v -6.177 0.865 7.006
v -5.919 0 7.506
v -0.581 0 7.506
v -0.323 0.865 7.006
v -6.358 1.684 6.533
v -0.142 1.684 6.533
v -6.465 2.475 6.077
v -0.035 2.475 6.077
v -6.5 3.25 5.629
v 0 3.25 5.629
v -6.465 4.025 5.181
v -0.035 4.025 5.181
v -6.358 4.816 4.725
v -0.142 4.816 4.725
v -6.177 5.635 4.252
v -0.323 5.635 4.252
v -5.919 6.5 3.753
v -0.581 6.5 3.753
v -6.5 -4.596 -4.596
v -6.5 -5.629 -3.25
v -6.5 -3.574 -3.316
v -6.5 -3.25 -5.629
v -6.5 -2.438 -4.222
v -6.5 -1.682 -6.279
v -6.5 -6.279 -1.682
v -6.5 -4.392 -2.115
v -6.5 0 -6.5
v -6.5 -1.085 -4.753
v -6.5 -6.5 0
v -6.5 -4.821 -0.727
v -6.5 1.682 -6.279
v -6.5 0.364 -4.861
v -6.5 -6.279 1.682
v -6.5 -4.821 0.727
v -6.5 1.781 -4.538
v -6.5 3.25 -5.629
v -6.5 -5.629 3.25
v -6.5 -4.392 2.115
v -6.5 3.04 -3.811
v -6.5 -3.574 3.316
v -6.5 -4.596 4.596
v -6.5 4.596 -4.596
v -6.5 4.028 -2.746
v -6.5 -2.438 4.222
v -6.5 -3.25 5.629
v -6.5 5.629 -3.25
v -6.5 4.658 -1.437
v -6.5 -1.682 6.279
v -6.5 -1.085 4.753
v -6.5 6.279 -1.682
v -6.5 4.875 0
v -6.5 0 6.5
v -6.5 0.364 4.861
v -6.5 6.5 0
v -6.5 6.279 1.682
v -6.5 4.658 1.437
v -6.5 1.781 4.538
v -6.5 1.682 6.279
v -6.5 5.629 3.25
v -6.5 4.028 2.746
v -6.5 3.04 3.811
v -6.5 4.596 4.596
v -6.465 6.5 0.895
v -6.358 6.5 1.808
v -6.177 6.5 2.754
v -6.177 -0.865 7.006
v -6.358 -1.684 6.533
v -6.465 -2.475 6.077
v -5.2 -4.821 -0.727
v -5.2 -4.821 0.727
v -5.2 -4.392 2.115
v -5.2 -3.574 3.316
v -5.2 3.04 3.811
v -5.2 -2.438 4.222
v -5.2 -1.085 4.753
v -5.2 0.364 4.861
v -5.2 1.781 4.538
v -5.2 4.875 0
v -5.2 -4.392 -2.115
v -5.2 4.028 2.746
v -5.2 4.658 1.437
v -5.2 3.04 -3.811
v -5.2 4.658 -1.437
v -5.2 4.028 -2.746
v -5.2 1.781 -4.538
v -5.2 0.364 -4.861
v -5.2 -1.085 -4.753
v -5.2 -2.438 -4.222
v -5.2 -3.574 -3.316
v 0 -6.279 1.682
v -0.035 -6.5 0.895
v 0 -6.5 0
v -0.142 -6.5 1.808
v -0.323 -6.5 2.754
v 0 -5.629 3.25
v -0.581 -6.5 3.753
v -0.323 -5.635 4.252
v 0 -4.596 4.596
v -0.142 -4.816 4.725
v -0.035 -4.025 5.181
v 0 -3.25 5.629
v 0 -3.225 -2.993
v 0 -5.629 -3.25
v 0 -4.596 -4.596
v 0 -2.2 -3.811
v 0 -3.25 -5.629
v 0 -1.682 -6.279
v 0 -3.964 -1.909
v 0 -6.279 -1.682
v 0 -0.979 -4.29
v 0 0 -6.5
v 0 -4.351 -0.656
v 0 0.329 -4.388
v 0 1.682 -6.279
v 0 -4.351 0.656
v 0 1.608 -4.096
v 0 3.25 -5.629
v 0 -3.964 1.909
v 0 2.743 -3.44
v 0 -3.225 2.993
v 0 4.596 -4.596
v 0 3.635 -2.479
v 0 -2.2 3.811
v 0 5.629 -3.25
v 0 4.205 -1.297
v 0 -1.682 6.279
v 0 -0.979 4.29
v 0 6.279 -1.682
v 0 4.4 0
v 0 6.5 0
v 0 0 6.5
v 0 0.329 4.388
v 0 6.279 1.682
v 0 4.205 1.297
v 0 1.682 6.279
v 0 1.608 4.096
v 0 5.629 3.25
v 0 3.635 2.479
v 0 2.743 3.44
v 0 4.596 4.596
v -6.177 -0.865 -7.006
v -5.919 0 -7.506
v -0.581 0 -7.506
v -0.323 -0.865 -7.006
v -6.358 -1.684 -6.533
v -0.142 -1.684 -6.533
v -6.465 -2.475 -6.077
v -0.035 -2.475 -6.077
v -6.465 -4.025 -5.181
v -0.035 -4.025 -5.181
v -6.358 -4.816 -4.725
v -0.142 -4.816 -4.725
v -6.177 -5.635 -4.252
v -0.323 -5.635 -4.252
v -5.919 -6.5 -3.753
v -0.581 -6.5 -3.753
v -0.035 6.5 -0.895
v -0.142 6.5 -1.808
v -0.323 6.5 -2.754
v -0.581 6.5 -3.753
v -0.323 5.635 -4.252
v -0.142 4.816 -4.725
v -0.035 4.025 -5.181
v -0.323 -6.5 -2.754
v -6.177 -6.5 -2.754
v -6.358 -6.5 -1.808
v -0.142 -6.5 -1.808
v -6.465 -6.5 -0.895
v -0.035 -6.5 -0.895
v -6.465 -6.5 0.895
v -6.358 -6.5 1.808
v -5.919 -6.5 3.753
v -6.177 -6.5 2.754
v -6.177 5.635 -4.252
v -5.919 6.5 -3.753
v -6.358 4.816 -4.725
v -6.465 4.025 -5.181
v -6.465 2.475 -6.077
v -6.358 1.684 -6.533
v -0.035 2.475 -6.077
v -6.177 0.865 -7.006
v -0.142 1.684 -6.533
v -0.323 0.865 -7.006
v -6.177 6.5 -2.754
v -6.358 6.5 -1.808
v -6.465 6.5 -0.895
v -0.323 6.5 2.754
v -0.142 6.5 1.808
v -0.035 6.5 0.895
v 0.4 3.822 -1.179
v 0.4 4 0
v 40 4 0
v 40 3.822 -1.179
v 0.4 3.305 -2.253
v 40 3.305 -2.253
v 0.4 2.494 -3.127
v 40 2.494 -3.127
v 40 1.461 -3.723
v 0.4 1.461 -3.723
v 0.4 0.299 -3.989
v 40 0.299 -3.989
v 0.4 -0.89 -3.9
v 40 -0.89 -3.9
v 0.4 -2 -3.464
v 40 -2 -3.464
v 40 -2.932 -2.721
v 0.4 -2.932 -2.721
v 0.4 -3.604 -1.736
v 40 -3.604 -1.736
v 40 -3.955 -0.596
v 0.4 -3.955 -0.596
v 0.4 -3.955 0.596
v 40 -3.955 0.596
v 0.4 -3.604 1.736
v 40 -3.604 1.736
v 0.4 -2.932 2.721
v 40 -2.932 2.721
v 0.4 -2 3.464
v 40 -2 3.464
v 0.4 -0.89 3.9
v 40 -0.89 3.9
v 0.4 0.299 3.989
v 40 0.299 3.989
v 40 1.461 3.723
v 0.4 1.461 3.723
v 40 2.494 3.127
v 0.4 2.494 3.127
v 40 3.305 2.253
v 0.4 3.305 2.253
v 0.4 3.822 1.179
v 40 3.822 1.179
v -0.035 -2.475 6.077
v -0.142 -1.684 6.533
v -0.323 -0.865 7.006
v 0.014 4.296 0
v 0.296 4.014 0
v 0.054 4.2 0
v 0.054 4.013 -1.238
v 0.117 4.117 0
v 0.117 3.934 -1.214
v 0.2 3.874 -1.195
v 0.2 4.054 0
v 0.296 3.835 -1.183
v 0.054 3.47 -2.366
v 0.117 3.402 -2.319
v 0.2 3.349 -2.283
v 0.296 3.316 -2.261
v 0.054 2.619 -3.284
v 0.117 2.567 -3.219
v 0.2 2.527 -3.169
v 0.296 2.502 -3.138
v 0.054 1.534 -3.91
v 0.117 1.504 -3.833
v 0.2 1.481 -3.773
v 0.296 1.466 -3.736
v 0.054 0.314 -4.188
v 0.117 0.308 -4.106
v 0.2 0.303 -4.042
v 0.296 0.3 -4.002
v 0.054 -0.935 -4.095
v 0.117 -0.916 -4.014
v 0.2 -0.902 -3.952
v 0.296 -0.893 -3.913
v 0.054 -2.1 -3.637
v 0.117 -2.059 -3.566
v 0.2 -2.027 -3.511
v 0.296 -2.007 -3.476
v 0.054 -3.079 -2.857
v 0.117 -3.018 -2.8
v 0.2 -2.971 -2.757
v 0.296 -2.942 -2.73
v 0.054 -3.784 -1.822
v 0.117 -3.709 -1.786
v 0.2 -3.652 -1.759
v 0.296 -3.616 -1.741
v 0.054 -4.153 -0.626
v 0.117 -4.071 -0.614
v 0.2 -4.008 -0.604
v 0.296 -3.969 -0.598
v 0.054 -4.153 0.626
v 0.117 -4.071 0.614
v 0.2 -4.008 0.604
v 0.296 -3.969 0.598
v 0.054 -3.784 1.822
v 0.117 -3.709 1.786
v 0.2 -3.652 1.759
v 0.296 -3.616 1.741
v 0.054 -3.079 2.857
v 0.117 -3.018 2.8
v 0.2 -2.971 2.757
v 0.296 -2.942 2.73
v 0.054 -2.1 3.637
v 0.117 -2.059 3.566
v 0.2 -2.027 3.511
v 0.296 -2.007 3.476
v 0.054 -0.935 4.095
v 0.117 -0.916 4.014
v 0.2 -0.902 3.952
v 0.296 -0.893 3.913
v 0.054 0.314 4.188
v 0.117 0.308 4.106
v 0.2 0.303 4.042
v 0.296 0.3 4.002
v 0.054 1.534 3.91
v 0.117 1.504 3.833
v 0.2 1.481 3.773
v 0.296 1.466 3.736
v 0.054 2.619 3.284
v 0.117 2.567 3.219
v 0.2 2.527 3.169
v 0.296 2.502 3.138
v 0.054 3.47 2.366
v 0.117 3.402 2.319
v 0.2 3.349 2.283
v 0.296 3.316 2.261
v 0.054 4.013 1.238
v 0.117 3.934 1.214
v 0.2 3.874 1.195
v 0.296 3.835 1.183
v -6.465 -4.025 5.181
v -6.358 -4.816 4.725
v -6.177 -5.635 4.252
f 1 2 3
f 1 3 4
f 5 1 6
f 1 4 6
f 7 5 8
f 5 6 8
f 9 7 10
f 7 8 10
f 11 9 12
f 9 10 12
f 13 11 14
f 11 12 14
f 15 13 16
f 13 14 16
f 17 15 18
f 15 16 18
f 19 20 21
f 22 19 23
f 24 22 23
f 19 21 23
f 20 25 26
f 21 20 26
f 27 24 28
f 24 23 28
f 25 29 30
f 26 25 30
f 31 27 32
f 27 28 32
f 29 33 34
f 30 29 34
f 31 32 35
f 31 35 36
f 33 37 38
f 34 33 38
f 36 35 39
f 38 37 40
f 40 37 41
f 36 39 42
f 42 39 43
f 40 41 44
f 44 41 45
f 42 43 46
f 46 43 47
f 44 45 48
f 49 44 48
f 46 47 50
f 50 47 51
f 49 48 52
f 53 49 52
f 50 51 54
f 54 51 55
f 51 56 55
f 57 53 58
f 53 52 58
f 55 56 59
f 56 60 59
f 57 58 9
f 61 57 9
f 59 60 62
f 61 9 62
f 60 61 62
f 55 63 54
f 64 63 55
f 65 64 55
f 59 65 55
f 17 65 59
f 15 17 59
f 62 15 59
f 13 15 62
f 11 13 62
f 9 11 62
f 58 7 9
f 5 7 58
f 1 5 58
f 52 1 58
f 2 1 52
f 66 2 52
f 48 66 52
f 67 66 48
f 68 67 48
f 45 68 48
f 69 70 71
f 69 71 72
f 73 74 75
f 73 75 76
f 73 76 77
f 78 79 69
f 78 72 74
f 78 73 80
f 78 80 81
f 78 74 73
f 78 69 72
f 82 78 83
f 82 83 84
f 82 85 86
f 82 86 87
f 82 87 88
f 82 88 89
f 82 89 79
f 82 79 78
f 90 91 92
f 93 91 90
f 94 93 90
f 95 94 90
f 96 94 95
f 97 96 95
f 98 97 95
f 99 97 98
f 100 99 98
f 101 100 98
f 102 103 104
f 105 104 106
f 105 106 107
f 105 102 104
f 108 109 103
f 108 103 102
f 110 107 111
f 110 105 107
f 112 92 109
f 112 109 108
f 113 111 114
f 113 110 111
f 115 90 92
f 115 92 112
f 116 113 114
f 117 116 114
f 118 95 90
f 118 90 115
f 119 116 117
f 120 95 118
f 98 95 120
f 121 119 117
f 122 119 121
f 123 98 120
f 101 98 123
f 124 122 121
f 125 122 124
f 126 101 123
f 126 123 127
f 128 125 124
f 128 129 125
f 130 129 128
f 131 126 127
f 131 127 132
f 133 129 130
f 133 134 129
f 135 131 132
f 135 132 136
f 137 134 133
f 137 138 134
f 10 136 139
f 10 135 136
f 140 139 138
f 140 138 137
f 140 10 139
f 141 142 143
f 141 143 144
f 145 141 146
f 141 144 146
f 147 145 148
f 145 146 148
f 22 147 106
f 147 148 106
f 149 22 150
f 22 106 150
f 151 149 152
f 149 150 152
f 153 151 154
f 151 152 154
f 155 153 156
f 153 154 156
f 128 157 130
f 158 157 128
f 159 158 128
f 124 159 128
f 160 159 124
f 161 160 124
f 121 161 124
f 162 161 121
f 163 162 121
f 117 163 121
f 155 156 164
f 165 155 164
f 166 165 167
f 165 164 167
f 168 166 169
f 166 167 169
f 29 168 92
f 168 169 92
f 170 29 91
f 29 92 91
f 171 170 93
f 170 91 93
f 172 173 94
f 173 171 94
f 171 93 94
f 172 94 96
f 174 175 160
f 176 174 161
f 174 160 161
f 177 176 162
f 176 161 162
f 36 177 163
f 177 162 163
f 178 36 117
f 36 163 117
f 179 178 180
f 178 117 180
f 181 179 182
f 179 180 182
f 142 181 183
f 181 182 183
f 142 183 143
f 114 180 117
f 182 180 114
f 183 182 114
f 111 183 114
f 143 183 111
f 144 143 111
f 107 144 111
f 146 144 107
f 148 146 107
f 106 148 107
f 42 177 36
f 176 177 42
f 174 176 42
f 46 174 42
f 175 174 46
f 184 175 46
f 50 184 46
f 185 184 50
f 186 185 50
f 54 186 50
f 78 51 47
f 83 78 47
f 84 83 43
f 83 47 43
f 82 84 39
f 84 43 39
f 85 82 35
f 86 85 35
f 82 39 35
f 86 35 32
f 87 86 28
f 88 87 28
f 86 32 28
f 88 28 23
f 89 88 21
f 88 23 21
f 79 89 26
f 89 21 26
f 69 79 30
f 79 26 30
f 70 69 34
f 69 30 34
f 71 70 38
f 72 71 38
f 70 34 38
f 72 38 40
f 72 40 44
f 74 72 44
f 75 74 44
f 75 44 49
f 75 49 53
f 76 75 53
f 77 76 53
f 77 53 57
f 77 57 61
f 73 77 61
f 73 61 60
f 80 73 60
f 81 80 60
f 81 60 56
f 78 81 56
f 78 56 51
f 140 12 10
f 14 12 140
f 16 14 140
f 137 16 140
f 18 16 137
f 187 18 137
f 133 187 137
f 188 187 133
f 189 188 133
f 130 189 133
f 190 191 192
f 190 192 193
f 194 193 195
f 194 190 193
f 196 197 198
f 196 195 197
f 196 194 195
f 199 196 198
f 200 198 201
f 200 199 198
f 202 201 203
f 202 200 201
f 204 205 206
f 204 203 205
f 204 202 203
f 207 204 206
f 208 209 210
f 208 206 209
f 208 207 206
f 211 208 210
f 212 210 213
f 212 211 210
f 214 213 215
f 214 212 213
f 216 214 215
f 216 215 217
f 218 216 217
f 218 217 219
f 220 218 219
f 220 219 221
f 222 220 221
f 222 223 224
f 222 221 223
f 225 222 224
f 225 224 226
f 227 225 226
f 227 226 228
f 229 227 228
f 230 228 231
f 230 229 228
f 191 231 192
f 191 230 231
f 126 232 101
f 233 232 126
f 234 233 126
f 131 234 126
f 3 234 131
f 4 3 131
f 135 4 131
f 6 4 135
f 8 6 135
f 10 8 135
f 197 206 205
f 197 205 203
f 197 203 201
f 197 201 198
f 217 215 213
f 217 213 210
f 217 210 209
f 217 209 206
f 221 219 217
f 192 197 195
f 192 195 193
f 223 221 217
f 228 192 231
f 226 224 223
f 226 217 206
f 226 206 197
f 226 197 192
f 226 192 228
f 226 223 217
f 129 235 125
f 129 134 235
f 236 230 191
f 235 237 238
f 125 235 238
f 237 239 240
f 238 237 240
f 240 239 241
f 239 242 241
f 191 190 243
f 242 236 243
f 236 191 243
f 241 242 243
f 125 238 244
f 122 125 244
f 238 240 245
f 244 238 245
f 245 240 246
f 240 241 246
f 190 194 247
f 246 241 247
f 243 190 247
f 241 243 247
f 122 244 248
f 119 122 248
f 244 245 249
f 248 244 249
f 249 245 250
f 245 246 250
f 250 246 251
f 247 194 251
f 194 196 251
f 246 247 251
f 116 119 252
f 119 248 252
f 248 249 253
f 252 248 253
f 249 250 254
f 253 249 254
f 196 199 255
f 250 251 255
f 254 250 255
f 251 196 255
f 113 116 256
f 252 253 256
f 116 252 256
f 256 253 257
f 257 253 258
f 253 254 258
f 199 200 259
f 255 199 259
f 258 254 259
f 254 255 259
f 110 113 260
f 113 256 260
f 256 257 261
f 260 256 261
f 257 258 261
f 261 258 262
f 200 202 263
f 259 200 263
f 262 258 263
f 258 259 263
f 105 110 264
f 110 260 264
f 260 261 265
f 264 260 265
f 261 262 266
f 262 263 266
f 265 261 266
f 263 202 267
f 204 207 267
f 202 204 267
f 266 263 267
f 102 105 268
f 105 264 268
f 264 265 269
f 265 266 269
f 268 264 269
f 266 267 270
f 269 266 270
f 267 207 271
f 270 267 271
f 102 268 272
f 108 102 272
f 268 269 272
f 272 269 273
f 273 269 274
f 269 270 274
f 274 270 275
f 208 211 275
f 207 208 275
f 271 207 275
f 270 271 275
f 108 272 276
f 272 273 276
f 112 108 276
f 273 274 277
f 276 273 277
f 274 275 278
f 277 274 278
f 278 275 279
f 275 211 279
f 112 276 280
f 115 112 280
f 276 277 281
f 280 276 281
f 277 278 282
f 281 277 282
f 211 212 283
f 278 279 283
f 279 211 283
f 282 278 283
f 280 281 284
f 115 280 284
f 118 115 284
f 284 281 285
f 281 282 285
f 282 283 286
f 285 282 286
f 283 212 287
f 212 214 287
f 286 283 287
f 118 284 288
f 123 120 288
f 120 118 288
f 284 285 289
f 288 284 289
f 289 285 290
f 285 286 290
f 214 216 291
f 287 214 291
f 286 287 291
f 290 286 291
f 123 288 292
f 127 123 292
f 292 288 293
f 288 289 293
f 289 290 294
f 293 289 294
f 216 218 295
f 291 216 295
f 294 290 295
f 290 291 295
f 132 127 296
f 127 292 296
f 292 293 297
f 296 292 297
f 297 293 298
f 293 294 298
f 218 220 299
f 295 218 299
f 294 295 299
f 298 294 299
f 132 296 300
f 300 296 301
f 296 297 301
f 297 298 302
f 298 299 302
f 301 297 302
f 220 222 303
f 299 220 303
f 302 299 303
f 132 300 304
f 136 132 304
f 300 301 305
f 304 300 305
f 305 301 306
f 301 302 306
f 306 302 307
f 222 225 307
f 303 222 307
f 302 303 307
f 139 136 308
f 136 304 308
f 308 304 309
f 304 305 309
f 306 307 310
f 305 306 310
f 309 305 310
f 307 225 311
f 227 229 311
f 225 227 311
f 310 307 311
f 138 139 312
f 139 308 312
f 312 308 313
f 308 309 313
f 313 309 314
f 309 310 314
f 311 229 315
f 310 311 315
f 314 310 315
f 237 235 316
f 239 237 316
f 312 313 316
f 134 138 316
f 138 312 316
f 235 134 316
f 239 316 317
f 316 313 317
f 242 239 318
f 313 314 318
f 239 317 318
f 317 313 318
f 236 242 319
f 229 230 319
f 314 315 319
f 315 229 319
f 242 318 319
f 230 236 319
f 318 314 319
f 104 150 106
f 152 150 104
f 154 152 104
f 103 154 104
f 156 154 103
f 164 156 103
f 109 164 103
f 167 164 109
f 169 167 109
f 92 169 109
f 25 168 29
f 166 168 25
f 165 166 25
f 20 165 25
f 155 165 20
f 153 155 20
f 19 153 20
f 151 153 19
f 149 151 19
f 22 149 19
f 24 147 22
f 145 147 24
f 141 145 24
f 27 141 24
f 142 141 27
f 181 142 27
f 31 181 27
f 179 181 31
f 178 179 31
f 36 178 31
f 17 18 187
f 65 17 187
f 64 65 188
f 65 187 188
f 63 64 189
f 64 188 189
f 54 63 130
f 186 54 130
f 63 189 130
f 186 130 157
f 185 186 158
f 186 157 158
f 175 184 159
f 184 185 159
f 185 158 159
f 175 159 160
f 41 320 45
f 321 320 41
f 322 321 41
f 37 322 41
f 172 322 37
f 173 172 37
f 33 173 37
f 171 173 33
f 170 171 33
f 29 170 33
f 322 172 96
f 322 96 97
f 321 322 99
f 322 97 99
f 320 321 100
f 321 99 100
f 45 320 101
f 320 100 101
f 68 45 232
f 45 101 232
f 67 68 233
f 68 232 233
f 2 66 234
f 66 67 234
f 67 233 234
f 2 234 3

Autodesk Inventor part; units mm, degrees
ref_plane "YZ Plane" through (0, 0, 0) normal (1, 0, 0) x (0, 1, 0)
ref_plane "XZ Plane" through (0, 0, 0) normal (0, 1, 0) x (-1, 0, 0)
sketch "Sketch1" plane through (0, 0, 0) normal (0, 0, 1) x (1, 0, 0)
  line L0 (0, 4) -> (0, 0)
  line L1 (0, 0) -> (40, 0)
  line L2 (40, 0) -> (40, 4)
  line L3 (40, 4) -> (0, 4)
  line L4 (-8, 0) -> (48, 0) projected
  line L5 (0, -0.8) -> (0, 4.8) projected
  dimension "d0" = 8
  dimension "d1" = 40
revolve "Body" add sketch "Sketch1" angle 360 about axis through (0, 0, 0) along (1, 0, 0)
sketch "Sketch2" plane through (0, 0, 0) normal (1, 0, 0) x (0, 1, 0)
  line L0 (0, 7.5056) -> (6.5, 3.7528)
  line L1 (6.5, 3.7528) -> (6.5, -3.7528)
  line L2 (6.5, -3.7528) -> (0, -7.5056)
  line L3 (0, -7.5056) -> (-6.5, -3.7528)
  line L4 (-6.5, -3.7528) -> (-6.5, 3.7528)
  line L5 (-6.5, 3.7528) -> (0, 7.5056)
  line L6 (-9.1, 0) -> (9.1, 0) projected
  line L7 (0, -10.5078) -> (0, 10.5078) projected
  point P0 (0, 0)
  point P1 (0, 0)
  dimension "d2" = 13
extrude "Head" add sketch "Sketch2" against normal blind 6.5
sketch "Sketch3" plane through (-6.5, 0, 0) normal (-1, 0, 0) x (0, 1, 0)
  circle A0 centre (0, 0) radius 4.875
  point P0 (0, 0)
  dimension "d12" = 9.75
extrude "Indent1" cut sketch "Sketch3" against normal blind 1.3
sketch "Sketch4" plane through (0, 0, 0) normal (0, 0, 1) x (1, 0, 0)
  line L0 (-6.5, 7.5056) -> (-6.5, 6.5)
  line L1 (-6.5, 6.5) -> (-5.9194, 7.5056)
  line L2 (-5.9194, 7.5056) -> (-6.5, 7.5056)
  line L3 (0, 7.5056) -> (0, 6.5)
  line L4 (0, 6.5) -> (-0.5806, 7.5056)
  line L5 (-0.5806, 7.5056) -> (0, 7.5056)
  line L6 (0, 0) -> (-6.5, 0) projected
  line L7 (-6.5, 0) -> (-6.5, 6.5) projected
  line L8 (0, 0) -> (0, 6.5) projected
  line L9 (-7.8, 0) -> (1.3, 0) projected
  line L10 (-5.9194, 7.5056) -> (-0.5806, 7.5056) construction
  line L11 (0, -1.5011) -> (0, 9.0067) projected
  dimension "d6" = 30
  dimension "d7" = 30
  dimension "d16" = 13
  dimension "d17" = 13
  dimension "d18" = 15.0111
revolve "Chamfer1" cut sketch "Sketch4" angle 360 about axis through (-10, 0, 0) along (1, 0, 0)
fillet "Fillet1" radius 0.4 1 edges at (0, -4, 0)
thread "Thread" size "M8x1.25" class "6g" standard "ISO Metric profile" length 37.5
ref_plane "Work Plane1" through (3, 0, 0) normal (0, 0.5, 0.8660254) x (1, 0, 0)
equation "\"d2\" = SW"
equation "\"d3\" = KOH"
equation "\"d12\" = 0.75 * SW0"
equation "\"d14\" = 0.2 * KOH"
equation "\"d11\" = RR"
equation "\"d8\" = GEL"
equation "\"d0\" = GD"
equation "\"d1\" = NLG"
equation "\"d6\" = ANG1"
equation "\"d7\" = ANG1"
equation "\"d16\" = SW0"
equation "\"d17\" = SW0"
equation "\"d18\" = 1.1547 * SW"
equation "\"NLG\" = 40"
equation "\"KOH\" = 6.5"
equation "\"GD\" = NND"
equation "\"GEL\" = 37.5"
equation "\"SW\" = 13"
equation "\"SW0\" = SW"
equation "\"ANG1\" = 30deg"
equation "\"RR\" = 0.4"
equation "\"GUL\" = 0.61345 * PTC"
equation "\"SPD\" = NND - 1.2269 * PTC"
equation "\"GD1\" = THREADDIA - 1.2269 * PTC"
equation "\"THREADDIA\" = 8"
equation "\"SDH\" = 9.2"
equation "\"TOA\" = 30deg"
equation "\"BDM\" = NND"
equation "\"FAWI\" = 45deg"
equation "\"PTC\" = 1.25"
equation "\"NND\" = 8"
equation "\"GAL\" = 0.61345 * PTC"
equation "\"SD\" = 0"
equation "\"SD2\" = SDH"
equation "\"E0\" = 1.155 * SW"
properties part number "AS 1427 - M8 x 40" material "Steel, Mild"
